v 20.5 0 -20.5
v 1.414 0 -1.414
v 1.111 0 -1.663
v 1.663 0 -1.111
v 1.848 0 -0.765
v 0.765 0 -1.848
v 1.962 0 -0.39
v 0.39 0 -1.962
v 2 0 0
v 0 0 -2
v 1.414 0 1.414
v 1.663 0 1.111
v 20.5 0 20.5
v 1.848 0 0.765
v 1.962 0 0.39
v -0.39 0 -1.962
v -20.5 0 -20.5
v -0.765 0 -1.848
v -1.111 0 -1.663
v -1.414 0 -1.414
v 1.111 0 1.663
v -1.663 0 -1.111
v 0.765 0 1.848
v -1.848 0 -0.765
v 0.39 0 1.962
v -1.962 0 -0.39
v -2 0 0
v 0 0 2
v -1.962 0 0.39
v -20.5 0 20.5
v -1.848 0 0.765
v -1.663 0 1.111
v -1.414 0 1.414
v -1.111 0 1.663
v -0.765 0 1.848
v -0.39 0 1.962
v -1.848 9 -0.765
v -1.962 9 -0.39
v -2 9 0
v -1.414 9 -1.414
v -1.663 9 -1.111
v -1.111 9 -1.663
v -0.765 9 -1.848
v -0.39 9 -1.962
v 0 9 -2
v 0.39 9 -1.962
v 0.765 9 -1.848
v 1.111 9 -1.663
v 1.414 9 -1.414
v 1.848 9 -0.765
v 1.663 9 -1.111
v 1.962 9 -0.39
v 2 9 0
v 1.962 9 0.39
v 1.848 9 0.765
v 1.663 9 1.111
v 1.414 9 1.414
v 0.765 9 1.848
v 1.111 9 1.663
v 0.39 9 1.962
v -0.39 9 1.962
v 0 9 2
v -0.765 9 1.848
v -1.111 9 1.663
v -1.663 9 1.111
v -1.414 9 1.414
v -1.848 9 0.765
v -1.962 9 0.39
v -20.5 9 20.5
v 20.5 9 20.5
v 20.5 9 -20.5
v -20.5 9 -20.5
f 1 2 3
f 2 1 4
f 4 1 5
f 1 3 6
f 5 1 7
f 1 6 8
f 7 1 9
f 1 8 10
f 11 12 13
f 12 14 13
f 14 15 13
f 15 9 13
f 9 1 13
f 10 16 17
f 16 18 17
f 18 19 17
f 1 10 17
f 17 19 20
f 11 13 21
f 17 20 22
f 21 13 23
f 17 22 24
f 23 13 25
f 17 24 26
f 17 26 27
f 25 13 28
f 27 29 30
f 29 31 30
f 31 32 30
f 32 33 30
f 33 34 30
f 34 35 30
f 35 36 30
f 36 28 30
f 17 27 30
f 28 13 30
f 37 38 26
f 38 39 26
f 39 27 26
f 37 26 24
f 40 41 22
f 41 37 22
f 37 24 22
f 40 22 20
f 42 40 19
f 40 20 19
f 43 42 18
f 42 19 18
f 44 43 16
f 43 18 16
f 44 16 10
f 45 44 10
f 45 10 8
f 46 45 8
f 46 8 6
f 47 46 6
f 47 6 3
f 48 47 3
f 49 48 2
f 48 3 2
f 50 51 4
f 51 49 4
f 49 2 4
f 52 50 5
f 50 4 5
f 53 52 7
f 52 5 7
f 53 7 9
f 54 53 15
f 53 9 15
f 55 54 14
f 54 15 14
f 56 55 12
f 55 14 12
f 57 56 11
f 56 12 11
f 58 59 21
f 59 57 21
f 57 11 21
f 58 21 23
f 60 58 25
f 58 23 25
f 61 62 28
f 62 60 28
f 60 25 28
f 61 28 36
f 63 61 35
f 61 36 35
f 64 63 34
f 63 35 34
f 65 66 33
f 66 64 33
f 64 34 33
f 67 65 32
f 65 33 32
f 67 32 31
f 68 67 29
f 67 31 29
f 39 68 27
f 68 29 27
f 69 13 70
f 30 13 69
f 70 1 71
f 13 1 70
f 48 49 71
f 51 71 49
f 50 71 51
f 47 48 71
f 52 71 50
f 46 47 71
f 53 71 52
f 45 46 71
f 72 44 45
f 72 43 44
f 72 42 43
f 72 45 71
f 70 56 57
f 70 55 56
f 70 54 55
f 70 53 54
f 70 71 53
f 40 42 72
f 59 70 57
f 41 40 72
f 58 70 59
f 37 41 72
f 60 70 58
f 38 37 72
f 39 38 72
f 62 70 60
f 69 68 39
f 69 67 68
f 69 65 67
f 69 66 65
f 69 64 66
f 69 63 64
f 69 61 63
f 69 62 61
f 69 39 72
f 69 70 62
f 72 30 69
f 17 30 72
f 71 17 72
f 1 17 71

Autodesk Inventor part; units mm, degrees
ref_plane "YZ Plane" through (0, 0, 0) normal (1, 0, 0) x (0, 1, 0)
ref_plane "XZ Plane" through (0, 0, 0) normal (0, 1, 0) x (-1, 0, 0)
ref_plane "XY Plane" through (0, 0, 0) normal (0, 0, 1) x (1, 0, 0)
sketch "Sketch1" plane through (0, 0, 0) normal (0, 1, 0) x (-1, 0, 0)
  line L0 (-20.5, 20.5) -> (20.5, 20.5)
  line L1 (20.5, 20.5) -> (20.5, -20.5)
  line L2 (20.5, -20.5) -> (-20.5, -20.5)
  line L3 (-20.5, -20.5) -> (-20.5, 20.5)
  line L4 (-20.5, 20.5) -> (20.5, -20.5) construction
  line L5 (20.5, 20.5) -> (-20.5, -20.5) construction
  circle A0 centre (0, 0) radius 2
  dimension "d0" = 41
  dimension "d1" = 4
extrude "Extrusion1" add sketch "Sketch1" along normal blind 9
properties part number "peltier_41x41x9"
